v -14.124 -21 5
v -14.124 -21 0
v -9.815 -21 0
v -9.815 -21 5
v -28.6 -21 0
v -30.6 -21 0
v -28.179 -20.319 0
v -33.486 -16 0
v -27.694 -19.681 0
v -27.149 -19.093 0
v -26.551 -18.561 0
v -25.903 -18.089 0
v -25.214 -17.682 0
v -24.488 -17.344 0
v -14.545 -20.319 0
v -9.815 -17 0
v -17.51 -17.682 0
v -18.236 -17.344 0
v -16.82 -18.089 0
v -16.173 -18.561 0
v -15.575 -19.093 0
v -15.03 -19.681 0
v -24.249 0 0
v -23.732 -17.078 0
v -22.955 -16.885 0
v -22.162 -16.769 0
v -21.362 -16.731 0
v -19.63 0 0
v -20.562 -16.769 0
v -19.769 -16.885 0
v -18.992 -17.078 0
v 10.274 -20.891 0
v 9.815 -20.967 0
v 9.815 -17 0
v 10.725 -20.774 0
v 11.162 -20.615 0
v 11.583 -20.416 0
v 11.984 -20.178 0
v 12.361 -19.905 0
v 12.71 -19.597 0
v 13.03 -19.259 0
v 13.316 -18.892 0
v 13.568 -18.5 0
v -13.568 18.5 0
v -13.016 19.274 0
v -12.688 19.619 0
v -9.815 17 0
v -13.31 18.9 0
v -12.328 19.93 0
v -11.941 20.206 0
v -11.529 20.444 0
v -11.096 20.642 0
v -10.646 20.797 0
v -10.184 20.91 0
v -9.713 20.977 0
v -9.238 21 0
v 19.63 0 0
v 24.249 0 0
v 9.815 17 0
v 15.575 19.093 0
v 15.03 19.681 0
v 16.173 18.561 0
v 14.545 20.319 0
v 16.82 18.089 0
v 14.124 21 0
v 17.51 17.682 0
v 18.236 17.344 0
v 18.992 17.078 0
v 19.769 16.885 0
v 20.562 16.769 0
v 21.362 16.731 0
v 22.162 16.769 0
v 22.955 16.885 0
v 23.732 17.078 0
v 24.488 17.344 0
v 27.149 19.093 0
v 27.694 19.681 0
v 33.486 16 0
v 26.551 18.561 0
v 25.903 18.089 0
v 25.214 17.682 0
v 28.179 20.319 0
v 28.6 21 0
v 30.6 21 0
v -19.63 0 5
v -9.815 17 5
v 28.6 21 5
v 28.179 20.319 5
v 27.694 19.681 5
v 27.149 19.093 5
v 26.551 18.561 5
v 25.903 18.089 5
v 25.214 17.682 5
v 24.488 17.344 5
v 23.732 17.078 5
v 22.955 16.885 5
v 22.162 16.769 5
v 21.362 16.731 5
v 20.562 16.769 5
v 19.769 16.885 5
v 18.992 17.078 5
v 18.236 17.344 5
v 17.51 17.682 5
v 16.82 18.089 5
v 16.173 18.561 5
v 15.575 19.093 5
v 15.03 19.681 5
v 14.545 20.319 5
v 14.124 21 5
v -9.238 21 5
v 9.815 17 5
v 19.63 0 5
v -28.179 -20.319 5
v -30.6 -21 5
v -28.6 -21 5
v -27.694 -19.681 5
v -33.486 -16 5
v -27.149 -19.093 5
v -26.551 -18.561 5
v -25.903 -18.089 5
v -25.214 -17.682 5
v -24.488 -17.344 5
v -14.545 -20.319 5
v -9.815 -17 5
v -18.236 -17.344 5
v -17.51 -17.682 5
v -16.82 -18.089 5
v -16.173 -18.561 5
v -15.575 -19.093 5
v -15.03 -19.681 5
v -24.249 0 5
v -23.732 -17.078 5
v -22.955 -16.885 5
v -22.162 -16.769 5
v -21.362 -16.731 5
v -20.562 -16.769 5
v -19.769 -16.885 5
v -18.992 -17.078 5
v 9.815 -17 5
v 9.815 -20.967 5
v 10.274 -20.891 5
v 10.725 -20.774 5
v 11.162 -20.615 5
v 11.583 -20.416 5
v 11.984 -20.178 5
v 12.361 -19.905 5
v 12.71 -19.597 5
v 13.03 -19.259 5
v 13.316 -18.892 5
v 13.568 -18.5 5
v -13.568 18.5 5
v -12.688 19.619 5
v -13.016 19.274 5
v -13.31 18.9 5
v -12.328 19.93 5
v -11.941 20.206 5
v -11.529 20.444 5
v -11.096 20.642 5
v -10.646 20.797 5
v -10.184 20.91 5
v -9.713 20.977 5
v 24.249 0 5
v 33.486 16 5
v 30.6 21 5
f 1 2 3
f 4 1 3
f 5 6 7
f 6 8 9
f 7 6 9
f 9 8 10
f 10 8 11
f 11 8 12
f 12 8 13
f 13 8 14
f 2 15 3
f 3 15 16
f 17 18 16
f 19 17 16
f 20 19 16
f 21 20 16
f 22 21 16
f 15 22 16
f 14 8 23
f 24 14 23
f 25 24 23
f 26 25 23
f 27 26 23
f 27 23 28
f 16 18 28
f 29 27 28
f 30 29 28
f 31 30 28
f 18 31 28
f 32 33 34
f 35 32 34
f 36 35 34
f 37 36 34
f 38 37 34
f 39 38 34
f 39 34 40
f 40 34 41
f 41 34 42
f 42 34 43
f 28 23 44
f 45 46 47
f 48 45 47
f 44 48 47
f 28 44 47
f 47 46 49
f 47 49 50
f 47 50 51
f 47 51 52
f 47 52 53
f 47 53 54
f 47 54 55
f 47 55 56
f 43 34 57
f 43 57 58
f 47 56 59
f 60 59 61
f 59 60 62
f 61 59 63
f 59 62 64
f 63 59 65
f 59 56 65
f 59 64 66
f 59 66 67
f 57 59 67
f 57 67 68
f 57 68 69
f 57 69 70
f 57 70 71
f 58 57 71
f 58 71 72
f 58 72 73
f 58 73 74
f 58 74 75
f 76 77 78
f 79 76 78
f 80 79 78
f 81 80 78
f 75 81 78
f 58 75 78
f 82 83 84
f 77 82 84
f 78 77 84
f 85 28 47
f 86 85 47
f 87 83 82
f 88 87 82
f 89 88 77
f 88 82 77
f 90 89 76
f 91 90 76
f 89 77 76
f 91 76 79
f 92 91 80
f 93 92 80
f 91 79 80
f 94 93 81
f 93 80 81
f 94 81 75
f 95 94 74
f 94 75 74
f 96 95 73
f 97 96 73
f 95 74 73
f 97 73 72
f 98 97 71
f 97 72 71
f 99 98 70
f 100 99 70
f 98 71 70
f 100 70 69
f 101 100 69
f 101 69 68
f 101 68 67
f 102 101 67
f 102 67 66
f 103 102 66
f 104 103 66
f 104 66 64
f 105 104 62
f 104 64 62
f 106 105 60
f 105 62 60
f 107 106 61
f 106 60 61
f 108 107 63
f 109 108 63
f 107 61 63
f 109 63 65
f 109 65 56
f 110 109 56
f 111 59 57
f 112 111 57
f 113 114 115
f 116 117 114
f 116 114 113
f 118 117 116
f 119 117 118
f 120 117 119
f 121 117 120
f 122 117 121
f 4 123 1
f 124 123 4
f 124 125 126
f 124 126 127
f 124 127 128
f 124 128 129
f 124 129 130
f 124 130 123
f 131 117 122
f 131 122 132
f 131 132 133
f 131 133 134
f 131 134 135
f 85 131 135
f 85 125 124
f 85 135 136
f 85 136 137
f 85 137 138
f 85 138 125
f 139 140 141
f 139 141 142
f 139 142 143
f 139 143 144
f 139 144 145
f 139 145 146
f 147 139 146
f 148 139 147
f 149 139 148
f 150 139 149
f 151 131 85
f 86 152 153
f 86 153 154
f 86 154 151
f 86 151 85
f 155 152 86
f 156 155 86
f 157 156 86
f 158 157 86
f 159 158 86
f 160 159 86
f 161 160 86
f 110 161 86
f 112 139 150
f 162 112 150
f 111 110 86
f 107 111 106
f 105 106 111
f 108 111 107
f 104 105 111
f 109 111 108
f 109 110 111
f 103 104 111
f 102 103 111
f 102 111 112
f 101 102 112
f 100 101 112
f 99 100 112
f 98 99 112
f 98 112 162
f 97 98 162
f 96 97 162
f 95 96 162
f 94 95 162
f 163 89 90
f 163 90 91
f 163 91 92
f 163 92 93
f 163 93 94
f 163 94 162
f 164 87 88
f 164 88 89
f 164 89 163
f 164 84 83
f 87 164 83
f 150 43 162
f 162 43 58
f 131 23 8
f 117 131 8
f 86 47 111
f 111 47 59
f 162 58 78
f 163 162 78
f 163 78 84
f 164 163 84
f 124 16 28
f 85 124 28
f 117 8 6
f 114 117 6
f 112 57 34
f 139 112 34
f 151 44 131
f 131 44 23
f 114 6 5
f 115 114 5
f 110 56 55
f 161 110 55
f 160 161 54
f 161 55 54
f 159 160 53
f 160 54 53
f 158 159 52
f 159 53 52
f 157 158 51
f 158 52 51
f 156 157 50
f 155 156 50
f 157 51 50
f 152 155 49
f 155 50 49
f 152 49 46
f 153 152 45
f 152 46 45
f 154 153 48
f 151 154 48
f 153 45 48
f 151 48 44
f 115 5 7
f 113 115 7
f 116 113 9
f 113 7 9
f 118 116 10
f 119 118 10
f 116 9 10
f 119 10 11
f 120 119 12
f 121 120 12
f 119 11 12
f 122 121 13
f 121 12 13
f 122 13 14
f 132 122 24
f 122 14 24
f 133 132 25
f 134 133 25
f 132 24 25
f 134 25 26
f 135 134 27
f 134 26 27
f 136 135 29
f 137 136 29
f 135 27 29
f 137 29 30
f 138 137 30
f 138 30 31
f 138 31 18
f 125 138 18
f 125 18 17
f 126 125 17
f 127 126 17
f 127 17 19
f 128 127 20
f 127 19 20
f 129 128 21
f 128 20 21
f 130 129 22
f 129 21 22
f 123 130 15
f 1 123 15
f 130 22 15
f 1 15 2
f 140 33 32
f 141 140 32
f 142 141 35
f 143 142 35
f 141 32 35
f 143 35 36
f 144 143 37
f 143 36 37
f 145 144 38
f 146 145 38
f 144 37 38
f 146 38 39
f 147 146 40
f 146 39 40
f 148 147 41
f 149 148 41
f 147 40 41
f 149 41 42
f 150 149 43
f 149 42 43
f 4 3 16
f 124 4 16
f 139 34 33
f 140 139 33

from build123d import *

# Parameters (mm, degrees)
F1_DEPTH = 5


with BuildPart() as f1:
    # F0 (on Top) → F1 (new body)
    with BuildSketch(Plane.XY):
        with BuildLine():
            Line((12.124356, 21), (24.248711, 0))
            Line((24.248711, 0), (33.486316, 16))
            Line((33.486316, 16), (30.599564, 21))
            Line((30.599564, 21), (28.599564, 21))
            ThreePointArc((28.599564, 21), (21.36196, 16.730604), (14.124356, 21))
            Line((14.124356, 21), (12.124356, 21))
        make_face()
        with BuildLine():
            Line((-9.814955, -17), (-19.629909, 0))
            Line((-19.629909, 0), (-9.814955, 17))
            Line((-9.814955, 17), (9.814955, 17))
            Line((9.814955, 17), (19.629909, 0))
            Line((19.629909, 0), (9.814955, -17))
            Line((9.814955, -17), (9.814955, -20.966555))
            ThreePointArc((9.814955, -20.966555), (11.983839, -20.1783), (13.567731, -18.5))
            Line((13.567731, -18.5), (24.248711, 0))
            Line((24.248711, 0), (12.124356, 21))
            Line((12.124356, 21), (-9.237604, 21))
            ThreePointArc((-9.237604, 21), (-11.737604, 20.330127), (-13.567731, 18.5))
            Line((-13.567731, 18.5), (-24.248711, 0))
            Line((-24.248711, 0), (-12.124356, -21))
            Line((-12.124356, -21), (-9.814955, -21))
            Line((-9.814955, -21), (-9.814955, -17))
        make_face()
        with BuildLine():
            Line((-14.124356, -21), (-12.124356, -21))
            Line((-12.124356, -21), (-24.248711, 0))
            Line((-24.248711, 0), (-33.486316, -16))
            Line((-33.486316, -16), (-30.599564, -21))
            Line((-30.599564, -21), (-28.599564, -21))
            ThreePointArc((-28.599564, -21), (-21.36196, -16.730604), (-14.124356, -21))
        make_face()
    extrude(amount=F1_DEPTH)


solid = f1.part
